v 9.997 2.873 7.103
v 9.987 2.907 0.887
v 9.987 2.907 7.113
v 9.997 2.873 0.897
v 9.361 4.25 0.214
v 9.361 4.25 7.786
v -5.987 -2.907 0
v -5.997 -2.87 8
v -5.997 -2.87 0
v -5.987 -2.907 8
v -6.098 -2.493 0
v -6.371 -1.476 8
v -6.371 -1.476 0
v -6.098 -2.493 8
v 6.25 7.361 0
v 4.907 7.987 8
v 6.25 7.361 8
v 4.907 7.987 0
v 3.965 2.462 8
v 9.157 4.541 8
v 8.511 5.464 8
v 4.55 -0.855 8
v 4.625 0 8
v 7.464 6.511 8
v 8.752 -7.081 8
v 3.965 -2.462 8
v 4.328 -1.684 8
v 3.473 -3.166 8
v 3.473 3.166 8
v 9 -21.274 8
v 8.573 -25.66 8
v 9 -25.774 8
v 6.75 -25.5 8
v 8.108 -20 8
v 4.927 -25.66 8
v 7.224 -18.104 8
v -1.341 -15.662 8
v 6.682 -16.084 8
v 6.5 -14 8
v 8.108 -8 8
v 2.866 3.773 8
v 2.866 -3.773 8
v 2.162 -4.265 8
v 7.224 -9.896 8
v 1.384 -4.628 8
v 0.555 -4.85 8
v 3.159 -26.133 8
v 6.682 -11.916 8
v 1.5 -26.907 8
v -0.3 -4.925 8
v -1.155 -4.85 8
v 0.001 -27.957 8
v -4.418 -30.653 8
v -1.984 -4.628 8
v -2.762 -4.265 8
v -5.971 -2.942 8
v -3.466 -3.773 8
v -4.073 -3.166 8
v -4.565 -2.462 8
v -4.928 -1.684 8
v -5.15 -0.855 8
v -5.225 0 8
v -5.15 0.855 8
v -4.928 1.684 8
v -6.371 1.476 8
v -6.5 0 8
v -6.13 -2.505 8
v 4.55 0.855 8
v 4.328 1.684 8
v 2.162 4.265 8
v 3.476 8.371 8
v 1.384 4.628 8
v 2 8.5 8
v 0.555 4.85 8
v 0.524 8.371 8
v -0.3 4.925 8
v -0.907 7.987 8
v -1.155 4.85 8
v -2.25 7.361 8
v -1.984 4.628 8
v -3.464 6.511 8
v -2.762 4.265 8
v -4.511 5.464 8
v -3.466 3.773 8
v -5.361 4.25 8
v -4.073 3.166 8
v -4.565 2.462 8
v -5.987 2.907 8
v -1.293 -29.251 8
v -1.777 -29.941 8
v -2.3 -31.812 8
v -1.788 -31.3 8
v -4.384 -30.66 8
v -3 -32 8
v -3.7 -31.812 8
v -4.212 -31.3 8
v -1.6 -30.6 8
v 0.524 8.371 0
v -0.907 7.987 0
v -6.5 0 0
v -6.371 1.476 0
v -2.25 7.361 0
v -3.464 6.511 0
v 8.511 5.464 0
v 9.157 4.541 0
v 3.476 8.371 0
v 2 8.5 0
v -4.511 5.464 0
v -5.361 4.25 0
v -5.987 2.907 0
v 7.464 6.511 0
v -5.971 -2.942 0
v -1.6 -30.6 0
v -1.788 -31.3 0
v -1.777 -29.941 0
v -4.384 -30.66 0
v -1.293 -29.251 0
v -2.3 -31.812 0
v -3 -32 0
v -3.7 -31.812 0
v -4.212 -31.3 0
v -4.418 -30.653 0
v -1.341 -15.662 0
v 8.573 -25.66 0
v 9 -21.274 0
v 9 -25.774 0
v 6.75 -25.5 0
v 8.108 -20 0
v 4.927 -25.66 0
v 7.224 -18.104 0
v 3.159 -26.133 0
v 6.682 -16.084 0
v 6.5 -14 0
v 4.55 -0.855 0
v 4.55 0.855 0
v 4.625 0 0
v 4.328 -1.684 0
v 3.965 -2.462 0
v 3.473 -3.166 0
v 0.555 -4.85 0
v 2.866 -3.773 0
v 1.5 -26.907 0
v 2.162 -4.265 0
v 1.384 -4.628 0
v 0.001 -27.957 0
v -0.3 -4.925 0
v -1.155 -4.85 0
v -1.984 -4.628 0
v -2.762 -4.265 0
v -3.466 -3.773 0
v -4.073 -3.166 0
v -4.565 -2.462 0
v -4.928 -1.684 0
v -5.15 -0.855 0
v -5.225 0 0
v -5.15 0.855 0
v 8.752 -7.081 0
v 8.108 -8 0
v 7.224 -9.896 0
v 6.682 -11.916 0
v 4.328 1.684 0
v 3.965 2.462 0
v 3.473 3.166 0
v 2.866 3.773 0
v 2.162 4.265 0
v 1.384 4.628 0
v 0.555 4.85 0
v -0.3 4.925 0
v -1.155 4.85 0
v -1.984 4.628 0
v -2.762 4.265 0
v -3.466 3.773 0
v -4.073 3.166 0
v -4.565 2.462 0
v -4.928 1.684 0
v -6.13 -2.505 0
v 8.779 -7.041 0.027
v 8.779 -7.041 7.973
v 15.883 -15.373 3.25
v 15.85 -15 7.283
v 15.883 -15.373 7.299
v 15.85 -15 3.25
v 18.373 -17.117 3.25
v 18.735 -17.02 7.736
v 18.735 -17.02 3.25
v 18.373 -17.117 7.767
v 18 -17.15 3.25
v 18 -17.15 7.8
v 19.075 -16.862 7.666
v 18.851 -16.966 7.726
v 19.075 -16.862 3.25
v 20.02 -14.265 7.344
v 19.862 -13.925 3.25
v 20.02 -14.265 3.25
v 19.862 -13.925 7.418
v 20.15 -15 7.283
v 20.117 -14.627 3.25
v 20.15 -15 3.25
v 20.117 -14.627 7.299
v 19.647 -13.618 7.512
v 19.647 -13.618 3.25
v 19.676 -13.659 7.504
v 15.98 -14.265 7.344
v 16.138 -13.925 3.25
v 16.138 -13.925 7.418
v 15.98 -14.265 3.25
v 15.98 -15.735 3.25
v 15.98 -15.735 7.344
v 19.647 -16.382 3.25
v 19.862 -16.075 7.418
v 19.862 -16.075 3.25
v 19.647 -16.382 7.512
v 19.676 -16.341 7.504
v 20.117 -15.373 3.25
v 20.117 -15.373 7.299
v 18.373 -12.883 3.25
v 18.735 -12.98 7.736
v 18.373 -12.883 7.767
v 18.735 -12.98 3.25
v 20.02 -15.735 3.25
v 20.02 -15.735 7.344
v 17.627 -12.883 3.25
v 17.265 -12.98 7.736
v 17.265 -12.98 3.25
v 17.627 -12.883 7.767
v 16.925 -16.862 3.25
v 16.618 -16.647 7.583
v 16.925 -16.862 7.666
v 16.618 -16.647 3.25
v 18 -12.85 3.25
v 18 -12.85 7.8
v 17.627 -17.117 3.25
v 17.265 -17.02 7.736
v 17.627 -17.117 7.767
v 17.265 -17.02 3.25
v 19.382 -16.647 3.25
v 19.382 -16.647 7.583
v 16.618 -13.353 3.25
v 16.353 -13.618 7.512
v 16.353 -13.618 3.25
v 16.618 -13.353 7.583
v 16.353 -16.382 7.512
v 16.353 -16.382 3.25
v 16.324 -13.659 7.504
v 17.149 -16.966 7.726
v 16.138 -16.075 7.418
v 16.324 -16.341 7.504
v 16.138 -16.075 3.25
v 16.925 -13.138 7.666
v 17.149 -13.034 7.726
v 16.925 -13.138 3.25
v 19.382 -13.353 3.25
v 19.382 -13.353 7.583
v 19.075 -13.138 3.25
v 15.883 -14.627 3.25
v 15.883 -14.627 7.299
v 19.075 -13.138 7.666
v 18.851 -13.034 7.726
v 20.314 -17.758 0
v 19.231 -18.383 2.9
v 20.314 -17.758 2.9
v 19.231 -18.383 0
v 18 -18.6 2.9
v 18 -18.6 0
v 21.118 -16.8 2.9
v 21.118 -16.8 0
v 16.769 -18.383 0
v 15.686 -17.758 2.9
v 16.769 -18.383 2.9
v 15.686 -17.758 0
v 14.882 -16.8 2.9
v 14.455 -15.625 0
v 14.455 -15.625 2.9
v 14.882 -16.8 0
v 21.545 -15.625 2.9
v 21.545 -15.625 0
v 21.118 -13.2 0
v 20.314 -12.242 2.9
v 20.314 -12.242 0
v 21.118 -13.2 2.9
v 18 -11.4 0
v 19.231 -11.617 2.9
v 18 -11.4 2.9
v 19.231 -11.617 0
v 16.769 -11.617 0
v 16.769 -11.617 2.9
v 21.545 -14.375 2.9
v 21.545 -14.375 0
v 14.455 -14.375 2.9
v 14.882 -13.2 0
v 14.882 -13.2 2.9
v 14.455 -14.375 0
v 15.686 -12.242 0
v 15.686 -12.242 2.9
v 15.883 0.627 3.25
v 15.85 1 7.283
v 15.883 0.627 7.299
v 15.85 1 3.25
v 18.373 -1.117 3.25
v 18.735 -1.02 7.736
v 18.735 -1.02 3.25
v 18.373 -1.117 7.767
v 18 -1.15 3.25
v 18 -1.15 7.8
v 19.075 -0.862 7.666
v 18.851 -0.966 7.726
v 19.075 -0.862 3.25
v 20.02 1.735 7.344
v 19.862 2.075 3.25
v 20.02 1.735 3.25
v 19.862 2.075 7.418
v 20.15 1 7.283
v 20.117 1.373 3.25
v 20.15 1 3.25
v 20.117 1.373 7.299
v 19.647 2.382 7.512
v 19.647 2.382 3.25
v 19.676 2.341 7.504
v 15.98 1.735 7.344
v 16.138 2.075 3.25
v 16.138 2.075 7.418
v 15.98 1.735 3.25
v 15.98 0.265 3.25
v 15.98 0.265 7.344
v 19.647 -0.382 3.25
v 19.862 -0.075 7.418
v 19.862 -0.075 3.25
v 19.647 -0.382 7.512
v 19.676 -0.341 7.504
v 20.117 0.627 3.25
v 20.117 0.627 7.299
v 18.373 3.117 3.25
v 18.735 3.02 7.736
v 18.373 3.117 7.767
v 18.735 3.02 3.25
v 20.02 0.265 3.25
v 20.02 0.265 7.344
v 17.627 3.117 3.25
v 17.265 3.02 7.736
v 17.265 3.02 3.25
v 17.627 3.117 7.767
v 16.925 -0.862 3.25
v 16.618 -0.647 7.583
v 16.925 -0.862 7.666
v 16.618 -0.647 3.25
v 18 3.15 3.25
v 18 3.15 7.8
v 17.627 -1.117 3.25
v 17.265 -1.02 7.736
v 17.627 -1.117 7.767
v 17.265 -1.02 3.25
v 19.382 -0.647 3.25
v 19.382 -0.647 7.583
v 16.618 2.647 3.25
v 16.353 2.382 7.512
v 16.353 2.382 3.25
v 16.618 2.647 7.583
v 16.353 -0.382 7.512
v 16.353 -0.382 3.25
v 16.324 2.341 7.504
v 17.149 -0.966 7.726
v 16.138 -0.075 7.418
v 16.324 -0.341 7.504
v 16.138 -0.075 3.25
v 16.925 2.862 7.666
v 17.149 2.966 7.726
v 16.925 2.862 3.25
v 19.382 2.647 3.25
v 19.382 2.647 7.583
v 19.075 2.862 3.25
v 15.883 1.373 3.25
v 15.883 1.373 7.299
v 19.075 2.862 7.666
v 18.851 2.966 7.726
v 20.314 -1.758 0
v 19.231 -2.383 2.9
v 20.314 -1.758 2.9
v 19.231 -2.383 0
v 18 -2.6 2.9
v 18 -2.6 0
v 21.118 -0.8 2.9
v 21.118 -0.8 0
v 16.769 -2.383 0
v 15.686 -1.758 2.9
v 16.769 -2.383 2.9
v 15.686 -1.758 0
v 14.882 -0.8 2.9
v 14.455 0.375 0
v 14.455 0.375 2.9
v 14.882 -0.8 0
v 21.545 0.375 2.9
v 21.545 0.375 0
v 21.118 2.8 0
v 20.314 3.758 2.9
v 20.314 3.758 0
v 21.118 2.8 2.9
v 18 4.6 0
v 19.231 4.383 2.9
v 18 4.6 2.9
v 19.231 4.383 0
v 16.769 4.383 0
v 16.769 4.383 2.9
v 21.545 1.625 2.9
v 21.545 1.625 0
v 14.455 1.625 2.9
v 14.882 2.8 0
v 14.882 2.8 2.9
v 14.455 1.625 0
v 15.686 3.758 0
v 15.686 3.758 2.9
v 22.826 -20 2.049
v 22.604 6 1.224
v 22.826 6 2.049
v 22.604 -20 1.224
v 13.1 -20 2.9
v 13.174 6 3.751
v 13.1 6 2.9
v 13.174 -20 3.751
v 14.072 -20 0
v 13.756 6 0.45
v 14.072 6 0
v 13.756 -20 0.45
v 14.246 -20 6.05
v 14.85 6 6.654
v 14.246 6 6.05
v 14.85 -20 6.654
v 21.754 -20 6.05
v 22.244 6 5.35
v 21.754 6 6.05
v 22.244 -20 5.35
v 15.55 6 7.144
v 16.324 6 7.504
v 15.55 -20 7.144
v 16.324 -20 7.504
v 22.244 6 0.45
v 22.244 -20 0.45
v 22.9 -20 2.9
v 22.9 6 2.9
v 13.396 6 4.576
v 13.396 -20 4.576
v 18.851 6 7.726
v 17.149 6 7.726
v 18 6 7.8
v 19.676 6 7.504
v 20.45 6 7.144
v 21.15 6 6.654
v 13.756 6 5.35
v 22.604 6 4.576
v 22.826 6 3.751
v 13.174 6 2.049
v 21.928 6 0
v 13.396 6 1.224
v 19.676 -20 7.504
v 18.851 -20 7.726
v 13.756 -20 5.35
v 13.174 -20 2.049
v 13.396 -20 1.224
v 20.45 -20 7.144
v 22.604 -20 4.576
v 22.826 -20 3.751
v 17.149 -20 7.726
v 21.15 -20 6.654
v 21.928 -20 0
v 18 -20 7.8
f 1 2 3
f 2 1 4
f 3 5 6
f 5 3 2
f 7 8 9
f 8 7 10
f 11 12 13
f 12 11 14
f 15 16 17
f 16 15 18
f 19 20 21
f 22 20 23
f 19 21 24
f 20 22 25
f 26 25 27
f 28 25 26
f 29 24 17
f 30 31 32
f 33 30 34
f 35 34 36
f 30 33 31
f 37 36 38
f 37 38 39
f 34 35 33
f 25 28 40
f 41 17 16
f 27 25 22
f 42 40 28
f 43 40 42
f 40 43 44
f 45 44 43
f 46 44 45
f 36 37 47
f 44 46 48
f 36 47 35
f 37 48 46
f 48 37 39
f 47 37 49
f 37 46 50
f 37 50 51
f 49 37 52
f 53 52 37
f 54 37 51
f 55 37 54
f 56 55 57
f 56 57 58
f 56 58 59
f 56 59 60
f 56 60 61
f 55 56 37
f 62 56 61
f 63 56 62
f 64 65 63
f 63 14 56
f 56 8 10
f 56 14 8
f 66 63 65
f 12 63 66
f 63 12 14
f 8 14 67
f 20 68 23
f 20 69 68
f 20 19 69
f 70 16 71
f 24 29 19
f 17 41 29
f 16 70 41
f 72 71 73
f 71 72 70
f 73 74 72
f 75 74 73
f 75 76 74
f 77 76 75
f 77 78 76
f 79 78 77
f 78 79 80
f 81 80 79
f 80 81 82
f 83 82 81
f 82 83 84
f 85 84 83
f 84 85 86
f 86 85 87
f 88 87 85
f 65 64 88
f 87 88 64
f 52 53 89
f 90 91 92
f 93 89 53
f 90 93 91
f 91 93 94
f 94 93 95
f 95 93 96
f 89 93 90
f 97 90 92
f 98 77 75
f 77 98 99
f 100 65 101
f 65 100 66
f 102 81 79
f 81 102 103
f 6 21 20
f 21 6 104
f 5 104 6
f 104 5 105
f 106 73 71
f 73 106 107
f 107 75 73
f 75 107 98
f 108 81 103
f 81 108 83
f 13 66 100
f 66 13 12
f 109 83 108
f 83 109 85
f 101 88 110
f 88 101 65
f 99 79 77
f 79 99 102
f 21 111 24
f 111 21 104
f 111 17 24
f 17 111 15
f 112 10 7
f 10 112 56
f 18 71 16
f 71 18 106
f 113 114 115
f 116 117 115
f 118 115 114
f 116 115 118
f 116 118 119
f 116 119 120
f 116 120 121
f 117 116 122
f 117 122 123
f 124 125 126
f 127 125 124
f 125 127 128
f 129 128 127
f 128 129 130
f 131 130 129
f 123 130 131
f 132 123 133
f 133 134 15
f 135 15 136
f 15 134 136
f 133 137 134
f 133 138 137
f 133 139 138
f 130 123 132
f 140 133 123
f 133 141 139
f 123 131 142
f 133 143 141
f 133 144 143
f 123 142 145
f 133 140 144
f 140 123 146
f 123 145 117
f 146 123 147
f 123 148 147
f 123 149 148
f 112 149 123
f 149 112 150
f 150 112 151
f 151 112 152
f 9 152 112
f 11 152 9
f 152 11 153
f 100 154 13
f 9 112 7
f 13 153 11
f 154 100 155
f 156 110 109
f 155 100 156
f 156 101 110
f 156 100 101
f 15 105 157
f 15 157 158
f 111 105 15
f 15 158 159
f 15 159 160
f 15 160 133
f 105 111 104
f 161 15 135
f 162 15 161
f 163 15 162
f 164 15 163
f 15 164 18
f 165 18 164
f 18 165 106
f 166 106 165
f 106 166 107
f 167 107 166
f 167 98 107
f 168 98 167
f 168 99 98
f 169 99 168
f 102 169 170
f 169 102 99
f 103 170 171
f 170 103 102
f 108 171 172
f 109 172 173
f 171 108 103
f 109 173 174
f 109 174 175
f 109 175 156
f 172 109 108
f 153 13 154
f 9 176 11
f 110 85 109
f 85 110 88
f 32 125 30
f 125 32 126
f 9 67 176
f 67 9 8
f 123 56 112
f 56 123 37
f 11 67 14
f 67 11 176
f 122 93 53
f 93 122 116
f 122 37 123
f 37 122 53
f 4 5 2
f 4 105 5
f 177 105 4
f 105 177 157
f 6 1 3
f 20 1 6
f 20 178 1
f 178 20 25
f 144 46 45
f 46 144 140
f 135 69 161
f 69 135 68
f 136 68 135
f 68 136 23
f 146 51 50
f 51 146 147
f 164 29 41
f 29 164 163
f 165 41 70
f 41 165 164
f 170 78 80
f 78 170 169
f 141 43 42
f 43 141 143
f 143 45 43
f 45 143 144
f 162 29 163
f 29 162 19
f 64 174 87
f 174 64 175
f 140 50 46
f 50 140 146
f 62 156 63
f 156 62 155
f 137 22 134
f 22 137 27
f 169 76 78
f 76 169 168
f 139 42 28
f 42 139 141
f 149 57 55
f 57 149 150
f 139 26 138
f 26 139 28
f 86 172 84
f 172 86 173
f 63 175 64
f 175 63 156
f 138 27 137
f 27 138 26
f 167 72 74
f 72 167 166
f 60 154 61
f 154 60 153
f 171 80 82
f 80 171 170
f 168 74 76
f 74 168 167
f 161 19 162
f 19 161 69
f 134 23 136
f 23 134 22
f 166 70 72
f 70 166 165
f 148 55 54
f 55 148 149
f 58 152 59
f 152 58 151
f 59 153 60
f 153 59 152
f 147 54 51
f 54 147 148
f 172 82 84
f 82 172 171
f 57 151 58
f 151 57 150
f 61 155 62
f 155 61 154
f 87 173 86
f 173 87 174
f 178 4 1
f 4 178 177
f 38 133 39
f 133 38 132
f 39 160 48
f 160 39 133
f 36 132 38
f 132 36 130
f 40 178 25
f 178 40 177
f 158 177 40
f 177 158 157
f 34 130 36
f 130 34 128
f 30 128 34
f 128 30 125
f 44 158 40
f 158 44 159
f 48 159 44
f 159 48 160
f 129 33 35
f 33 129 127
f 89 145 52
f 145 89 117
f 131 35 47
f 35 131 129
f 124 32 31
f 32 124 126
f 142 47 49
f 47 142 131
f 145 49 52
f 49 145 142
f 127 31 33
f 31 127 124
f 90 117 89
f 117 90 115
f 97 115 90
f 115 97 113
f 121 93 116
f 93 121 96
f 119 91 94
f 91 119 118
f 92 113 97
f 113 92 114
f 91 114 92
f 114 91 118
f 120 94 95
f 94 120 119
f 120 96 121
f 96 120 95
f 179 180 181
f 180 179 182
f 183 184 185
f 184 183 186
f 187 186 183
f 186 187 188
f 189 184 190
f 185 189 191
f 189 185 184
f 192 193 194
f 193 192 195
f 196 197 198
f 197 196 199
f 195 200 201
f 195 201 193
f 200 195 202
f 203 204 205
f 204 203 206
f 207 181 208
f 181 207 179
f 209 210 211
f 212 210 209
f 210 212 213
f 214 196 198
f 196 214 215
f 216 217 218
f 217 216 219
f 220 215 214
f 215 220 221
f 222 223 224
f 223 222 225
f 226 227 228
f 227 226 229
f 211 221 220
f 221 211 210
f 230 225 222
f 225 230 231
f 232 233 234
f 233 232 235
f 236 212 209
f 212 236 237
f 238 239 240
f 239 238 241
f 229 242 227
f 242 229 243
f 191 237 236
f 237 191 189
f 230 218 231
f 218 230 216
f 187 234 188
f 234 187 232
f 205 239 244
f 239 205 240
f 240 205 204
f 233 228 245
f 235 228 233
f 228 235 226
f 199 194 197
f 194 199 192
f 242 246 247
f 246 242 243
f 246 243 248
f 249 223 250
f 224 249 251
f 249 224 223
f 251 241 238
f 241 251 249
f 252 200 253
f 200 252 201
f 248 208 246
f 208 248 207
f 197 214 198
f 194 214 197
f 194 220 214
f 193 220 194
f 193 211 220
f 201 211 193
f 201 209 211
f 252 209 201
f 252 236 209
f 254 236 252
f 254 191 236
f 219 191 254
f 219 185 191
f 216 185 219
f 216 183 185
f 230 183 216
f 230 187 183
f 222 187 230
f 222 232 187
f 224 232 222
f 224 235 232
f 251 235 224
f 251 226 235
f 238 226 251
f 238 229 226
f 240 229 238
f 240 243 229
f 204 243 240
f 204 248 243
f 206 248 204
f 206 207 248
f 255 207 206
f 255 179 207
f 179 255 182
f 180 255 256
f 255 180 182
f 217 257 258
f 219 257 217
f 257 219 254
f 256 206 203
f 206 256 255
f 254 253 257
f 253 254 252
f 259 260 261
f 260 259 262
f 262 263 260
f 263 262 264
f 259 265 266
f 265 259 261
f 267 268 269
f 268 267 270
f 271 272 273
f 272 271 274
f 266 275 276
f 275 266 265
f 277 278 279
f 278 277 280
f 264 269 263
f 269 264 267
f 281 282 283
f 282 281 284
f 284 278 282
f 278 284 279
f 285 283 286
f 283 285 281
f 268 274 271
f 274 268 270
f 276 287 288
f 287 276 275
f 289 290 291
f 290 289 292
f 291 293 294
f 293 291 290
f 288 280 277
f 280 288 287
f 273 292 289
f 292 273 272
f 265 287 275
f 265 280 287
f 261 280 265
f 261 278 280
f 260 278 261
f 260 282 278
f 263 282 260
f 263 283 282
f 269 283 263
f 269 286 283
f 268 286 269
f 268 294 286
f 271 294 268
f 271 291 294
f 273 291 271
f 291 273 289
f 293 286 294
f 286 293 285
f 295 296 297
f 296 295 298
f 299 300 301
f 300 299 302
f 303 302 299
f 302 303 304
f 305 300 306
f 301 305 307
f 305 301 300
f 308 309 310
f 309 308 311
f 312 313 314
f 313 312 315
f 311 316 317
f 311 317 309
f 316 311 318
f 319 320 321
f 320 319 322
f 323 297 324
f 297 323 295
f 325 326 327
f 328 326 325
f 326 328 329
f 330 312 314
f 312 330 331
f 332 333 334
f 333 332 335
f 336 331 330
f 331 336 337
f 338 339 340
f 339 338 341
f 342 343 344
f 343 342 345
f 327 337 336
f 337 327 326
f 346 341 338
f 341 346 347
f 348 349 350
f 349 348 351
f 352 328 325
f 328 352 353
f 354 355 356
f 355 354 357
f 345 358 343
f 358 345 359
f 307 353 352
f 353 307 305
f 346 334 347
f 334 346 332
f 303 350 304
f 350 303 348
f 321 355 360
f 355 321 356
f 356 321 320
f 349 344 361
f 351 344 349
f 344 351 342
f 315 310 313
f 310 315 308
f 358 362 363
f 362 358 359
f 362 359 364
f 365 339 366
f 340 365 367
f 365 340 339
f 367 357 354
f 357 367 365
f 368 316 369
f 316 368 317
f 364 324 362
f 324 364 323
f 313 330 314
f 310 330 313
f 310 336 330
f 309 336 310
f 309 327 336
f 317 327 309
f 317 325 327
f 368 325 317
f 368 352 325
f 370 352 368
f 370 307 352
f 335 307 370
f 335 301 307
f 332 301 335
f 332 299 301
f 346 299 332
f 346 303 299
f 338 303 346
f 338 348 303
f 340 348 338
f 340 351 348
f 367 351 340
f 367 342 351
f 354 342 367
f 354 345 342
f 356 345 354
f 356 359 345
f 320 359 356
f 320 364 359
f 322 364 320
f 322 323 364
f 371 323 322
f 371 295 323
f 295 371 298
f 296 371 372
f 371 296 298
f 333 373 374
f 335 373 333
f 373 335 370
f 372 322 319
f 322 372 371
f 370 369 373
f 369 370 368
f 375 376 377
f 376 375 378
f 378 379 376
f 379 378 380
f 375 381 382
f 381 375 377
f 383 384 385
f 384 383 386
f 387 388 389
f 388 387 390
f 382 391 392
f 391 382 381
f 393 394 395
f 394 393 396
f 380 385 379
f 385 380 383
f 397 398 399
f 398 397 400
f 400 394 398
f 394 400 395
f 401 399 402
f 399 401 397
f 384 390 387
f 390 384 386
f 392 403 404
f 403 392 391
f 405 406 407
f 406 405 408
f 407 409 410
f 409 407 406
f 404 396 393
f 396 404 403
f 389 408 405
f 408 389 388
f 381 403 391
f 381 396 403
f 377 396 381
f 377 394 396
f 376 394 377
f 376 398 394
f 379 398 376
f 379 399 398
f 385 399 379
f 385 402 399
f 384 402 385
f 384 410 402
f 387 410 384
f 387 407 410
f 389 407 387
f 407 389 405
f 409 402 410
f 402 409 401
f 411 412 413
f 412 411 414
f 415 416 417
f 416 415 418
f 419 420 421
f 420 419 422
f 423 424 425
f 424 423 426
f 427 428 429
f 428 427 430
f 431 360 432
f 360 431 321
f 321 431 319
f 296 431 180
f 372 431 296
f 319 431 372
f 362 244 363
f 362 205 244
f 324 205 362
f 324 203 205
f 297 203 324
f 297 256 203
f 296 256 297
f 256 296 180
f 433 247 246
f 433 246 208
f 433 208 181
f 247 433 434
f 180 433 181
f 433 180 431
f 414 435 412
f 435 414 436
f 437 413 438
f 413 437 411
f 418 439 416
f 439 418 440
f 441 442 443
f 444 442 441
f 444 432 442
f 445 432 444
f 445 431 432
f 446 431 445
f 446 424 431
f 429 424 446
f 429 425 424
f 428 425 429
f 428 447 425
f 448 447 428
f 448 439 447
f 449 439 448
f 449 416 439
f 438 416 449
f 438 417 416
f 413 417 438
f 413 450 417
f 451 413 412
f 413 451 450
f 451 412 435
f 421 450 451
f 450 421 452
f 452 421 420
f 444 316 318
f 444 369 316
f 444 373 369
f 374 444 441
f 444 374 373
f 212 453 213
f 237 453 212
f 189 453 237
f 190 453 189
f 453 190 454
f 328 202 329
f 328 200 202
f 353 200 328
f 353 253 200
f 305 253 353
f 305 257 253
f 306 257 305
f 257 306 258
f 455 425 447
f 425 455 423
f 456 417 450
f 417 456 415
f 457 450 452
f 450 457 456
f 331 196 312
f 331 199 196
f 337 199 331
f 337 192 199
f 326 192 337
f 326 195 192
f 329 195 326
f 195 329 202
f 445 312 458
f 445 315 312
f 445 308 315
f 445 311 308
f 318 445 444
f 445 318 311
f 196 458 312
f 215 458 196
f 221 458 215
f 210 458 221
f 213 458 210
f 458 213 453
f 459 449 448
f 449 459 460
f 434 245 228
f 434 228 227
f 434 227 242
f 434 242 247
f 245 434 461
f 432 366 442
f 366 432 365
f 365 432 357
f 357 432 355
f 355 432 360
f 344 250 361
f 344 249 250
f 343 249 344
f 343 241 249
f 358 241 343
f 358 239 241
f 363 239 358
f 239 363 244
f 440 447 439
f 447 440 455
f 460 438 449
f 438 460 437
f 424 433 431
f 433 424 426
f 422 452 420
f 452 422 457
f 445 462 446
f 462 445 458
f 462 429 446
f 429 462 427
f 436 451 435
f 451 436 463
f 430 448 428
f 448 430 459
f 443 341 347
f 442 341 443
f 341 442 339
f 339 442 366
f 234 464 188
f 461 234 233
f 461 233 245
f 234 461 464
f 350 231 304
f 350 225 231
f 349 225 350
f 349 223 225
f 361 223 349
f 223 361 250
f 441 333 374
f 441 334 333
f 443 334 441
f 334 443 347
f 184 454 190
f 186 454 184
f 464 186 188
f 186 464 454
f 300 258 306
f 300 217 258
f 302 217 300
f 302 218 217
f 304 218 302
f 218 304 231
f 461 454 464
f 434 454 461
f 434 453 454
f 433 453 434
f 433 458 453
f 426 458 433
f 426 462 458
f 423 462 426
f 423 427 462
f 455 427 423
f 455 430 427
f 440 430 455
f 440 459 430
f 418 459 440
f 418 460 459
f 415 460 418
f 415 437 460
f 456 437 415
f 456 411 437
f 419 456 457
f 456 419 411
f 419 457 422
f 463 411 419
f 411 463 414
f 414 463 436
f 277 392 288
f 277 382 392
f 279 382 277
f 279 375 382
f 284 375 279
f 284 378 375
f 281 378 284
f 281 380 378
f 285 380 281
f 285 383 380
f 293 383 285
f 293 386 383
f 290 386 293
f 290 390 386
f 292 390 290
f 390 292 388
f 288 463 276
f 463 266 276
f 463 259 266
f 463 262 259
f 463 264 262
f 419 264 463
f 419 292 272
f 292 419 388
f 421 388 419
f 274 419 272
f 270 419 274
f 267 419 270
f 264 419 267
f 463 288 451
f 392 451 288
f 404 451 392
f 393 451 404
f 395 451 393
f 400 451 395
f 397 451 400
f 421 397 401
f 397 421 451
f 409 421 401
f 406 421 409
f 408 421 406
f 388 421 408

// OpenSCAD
//
// Fast Release Lever for AJGW Extruder
// (c) 2012 by Alain Mouette - GPL
//
// Derived from: Quick Release Lever for wade
//   by simon litwan, http://www.thingiverse.com/thing:22830
// Licence: Creative Commons: CC BY 3.0 (almost GPL...)


lever();
translate([18,-20,0])rotate([0,90,90]) bar();

layer_thickness=0.25;
$fn=36;
width=8;
extra_width=0.0;// extra on each side in idler fit
inclination=7;//6;
hole=9.55+0.3;
corner=[10,2.9,0];

bar_diameter=9.5+0.3;
bar_radiusr=bar_diameter/2;
bar_length=26;
bar_spring=7+0.2;

module lever(){
	difference(){
		union(){
			translate([2,0,0]) cylinder(r=17/2,h=width);// head
			rotate([0,0,-90]) cube([8.5,10,width]);// body right
			translate([-1,0,0]) rotate([0,0,-90]) cube([28,10,width]);// body right
			translate([-1,-16.6,0]) rotate([0,0,20]) cube([4,15,width]);// body left
			translate([-1,-14,0]) rotate([0,0,-101.6]) cube([17,5,width]);// body left
//			translate([-3.4,-29.8-1,0]) cylinder(r=1,h=width);
		}
		translate([-0.3,0,-0.1]) cylinder(r=hole/2, h=width+0.2);// center hole
		translate([10,2.9,-0.1]) rotate([0,0,-90-inclination]) cube([13,2,width+0.2]);// fit into idler
		translate([18.5,-14,-0.1]) cylinder(r=24/2, h=width+0.2);// bearing space
		translate([6.75,-36,-0.1]) cylinder(r=21/2, h=width+0.2);// finger space
		// 45° sides
		translate(corner+[-1,0,0]) rotate([0,0,-92]) translate([-3,0,0]){
			//cube([16,1,width]);// for viewing only
			translate([-0.1,0,-extra_width-0.1]) rotate([-45,0,0]) cube([16,2,2]);
			translate([-0.1,0,width+extra_width+0.1]) rotate([-45,0,0]) cube([16,2,2]);
		}
  	}
#	translate([-3,-30.6,0]) cylinder(r=1.4, h=width, $fn=12);
}

module bar(){
	difference(){
		translate([-bar_radiusr+2,0,0])cylinder(h=bar_length,r=bar_radiusr);
		translate([0,-bar_radiusr,0])cube([bar_diameter,bar_diameter,bar_length]);
		translate([0,0,5])rotate([0,90,180])m4Screw();
		translate([0,0,bar_length-5])rotate([0,90,180])m4Screw();
	}
}

module m4Screw(h=15) {
	union() {
		translate([0,0,3+layer_thickness])cylinder(h=h+3.3,r=4.3/2);
		translate([0,0,-0.1])cylinder(h=3,r=bar_spring/2,$fn=18);// round for spring
	}
}


// references
//%translate(corner+[-1,0,0]) rotate([0,0,-90]) cube([11.5,1,width]);// idler fit
